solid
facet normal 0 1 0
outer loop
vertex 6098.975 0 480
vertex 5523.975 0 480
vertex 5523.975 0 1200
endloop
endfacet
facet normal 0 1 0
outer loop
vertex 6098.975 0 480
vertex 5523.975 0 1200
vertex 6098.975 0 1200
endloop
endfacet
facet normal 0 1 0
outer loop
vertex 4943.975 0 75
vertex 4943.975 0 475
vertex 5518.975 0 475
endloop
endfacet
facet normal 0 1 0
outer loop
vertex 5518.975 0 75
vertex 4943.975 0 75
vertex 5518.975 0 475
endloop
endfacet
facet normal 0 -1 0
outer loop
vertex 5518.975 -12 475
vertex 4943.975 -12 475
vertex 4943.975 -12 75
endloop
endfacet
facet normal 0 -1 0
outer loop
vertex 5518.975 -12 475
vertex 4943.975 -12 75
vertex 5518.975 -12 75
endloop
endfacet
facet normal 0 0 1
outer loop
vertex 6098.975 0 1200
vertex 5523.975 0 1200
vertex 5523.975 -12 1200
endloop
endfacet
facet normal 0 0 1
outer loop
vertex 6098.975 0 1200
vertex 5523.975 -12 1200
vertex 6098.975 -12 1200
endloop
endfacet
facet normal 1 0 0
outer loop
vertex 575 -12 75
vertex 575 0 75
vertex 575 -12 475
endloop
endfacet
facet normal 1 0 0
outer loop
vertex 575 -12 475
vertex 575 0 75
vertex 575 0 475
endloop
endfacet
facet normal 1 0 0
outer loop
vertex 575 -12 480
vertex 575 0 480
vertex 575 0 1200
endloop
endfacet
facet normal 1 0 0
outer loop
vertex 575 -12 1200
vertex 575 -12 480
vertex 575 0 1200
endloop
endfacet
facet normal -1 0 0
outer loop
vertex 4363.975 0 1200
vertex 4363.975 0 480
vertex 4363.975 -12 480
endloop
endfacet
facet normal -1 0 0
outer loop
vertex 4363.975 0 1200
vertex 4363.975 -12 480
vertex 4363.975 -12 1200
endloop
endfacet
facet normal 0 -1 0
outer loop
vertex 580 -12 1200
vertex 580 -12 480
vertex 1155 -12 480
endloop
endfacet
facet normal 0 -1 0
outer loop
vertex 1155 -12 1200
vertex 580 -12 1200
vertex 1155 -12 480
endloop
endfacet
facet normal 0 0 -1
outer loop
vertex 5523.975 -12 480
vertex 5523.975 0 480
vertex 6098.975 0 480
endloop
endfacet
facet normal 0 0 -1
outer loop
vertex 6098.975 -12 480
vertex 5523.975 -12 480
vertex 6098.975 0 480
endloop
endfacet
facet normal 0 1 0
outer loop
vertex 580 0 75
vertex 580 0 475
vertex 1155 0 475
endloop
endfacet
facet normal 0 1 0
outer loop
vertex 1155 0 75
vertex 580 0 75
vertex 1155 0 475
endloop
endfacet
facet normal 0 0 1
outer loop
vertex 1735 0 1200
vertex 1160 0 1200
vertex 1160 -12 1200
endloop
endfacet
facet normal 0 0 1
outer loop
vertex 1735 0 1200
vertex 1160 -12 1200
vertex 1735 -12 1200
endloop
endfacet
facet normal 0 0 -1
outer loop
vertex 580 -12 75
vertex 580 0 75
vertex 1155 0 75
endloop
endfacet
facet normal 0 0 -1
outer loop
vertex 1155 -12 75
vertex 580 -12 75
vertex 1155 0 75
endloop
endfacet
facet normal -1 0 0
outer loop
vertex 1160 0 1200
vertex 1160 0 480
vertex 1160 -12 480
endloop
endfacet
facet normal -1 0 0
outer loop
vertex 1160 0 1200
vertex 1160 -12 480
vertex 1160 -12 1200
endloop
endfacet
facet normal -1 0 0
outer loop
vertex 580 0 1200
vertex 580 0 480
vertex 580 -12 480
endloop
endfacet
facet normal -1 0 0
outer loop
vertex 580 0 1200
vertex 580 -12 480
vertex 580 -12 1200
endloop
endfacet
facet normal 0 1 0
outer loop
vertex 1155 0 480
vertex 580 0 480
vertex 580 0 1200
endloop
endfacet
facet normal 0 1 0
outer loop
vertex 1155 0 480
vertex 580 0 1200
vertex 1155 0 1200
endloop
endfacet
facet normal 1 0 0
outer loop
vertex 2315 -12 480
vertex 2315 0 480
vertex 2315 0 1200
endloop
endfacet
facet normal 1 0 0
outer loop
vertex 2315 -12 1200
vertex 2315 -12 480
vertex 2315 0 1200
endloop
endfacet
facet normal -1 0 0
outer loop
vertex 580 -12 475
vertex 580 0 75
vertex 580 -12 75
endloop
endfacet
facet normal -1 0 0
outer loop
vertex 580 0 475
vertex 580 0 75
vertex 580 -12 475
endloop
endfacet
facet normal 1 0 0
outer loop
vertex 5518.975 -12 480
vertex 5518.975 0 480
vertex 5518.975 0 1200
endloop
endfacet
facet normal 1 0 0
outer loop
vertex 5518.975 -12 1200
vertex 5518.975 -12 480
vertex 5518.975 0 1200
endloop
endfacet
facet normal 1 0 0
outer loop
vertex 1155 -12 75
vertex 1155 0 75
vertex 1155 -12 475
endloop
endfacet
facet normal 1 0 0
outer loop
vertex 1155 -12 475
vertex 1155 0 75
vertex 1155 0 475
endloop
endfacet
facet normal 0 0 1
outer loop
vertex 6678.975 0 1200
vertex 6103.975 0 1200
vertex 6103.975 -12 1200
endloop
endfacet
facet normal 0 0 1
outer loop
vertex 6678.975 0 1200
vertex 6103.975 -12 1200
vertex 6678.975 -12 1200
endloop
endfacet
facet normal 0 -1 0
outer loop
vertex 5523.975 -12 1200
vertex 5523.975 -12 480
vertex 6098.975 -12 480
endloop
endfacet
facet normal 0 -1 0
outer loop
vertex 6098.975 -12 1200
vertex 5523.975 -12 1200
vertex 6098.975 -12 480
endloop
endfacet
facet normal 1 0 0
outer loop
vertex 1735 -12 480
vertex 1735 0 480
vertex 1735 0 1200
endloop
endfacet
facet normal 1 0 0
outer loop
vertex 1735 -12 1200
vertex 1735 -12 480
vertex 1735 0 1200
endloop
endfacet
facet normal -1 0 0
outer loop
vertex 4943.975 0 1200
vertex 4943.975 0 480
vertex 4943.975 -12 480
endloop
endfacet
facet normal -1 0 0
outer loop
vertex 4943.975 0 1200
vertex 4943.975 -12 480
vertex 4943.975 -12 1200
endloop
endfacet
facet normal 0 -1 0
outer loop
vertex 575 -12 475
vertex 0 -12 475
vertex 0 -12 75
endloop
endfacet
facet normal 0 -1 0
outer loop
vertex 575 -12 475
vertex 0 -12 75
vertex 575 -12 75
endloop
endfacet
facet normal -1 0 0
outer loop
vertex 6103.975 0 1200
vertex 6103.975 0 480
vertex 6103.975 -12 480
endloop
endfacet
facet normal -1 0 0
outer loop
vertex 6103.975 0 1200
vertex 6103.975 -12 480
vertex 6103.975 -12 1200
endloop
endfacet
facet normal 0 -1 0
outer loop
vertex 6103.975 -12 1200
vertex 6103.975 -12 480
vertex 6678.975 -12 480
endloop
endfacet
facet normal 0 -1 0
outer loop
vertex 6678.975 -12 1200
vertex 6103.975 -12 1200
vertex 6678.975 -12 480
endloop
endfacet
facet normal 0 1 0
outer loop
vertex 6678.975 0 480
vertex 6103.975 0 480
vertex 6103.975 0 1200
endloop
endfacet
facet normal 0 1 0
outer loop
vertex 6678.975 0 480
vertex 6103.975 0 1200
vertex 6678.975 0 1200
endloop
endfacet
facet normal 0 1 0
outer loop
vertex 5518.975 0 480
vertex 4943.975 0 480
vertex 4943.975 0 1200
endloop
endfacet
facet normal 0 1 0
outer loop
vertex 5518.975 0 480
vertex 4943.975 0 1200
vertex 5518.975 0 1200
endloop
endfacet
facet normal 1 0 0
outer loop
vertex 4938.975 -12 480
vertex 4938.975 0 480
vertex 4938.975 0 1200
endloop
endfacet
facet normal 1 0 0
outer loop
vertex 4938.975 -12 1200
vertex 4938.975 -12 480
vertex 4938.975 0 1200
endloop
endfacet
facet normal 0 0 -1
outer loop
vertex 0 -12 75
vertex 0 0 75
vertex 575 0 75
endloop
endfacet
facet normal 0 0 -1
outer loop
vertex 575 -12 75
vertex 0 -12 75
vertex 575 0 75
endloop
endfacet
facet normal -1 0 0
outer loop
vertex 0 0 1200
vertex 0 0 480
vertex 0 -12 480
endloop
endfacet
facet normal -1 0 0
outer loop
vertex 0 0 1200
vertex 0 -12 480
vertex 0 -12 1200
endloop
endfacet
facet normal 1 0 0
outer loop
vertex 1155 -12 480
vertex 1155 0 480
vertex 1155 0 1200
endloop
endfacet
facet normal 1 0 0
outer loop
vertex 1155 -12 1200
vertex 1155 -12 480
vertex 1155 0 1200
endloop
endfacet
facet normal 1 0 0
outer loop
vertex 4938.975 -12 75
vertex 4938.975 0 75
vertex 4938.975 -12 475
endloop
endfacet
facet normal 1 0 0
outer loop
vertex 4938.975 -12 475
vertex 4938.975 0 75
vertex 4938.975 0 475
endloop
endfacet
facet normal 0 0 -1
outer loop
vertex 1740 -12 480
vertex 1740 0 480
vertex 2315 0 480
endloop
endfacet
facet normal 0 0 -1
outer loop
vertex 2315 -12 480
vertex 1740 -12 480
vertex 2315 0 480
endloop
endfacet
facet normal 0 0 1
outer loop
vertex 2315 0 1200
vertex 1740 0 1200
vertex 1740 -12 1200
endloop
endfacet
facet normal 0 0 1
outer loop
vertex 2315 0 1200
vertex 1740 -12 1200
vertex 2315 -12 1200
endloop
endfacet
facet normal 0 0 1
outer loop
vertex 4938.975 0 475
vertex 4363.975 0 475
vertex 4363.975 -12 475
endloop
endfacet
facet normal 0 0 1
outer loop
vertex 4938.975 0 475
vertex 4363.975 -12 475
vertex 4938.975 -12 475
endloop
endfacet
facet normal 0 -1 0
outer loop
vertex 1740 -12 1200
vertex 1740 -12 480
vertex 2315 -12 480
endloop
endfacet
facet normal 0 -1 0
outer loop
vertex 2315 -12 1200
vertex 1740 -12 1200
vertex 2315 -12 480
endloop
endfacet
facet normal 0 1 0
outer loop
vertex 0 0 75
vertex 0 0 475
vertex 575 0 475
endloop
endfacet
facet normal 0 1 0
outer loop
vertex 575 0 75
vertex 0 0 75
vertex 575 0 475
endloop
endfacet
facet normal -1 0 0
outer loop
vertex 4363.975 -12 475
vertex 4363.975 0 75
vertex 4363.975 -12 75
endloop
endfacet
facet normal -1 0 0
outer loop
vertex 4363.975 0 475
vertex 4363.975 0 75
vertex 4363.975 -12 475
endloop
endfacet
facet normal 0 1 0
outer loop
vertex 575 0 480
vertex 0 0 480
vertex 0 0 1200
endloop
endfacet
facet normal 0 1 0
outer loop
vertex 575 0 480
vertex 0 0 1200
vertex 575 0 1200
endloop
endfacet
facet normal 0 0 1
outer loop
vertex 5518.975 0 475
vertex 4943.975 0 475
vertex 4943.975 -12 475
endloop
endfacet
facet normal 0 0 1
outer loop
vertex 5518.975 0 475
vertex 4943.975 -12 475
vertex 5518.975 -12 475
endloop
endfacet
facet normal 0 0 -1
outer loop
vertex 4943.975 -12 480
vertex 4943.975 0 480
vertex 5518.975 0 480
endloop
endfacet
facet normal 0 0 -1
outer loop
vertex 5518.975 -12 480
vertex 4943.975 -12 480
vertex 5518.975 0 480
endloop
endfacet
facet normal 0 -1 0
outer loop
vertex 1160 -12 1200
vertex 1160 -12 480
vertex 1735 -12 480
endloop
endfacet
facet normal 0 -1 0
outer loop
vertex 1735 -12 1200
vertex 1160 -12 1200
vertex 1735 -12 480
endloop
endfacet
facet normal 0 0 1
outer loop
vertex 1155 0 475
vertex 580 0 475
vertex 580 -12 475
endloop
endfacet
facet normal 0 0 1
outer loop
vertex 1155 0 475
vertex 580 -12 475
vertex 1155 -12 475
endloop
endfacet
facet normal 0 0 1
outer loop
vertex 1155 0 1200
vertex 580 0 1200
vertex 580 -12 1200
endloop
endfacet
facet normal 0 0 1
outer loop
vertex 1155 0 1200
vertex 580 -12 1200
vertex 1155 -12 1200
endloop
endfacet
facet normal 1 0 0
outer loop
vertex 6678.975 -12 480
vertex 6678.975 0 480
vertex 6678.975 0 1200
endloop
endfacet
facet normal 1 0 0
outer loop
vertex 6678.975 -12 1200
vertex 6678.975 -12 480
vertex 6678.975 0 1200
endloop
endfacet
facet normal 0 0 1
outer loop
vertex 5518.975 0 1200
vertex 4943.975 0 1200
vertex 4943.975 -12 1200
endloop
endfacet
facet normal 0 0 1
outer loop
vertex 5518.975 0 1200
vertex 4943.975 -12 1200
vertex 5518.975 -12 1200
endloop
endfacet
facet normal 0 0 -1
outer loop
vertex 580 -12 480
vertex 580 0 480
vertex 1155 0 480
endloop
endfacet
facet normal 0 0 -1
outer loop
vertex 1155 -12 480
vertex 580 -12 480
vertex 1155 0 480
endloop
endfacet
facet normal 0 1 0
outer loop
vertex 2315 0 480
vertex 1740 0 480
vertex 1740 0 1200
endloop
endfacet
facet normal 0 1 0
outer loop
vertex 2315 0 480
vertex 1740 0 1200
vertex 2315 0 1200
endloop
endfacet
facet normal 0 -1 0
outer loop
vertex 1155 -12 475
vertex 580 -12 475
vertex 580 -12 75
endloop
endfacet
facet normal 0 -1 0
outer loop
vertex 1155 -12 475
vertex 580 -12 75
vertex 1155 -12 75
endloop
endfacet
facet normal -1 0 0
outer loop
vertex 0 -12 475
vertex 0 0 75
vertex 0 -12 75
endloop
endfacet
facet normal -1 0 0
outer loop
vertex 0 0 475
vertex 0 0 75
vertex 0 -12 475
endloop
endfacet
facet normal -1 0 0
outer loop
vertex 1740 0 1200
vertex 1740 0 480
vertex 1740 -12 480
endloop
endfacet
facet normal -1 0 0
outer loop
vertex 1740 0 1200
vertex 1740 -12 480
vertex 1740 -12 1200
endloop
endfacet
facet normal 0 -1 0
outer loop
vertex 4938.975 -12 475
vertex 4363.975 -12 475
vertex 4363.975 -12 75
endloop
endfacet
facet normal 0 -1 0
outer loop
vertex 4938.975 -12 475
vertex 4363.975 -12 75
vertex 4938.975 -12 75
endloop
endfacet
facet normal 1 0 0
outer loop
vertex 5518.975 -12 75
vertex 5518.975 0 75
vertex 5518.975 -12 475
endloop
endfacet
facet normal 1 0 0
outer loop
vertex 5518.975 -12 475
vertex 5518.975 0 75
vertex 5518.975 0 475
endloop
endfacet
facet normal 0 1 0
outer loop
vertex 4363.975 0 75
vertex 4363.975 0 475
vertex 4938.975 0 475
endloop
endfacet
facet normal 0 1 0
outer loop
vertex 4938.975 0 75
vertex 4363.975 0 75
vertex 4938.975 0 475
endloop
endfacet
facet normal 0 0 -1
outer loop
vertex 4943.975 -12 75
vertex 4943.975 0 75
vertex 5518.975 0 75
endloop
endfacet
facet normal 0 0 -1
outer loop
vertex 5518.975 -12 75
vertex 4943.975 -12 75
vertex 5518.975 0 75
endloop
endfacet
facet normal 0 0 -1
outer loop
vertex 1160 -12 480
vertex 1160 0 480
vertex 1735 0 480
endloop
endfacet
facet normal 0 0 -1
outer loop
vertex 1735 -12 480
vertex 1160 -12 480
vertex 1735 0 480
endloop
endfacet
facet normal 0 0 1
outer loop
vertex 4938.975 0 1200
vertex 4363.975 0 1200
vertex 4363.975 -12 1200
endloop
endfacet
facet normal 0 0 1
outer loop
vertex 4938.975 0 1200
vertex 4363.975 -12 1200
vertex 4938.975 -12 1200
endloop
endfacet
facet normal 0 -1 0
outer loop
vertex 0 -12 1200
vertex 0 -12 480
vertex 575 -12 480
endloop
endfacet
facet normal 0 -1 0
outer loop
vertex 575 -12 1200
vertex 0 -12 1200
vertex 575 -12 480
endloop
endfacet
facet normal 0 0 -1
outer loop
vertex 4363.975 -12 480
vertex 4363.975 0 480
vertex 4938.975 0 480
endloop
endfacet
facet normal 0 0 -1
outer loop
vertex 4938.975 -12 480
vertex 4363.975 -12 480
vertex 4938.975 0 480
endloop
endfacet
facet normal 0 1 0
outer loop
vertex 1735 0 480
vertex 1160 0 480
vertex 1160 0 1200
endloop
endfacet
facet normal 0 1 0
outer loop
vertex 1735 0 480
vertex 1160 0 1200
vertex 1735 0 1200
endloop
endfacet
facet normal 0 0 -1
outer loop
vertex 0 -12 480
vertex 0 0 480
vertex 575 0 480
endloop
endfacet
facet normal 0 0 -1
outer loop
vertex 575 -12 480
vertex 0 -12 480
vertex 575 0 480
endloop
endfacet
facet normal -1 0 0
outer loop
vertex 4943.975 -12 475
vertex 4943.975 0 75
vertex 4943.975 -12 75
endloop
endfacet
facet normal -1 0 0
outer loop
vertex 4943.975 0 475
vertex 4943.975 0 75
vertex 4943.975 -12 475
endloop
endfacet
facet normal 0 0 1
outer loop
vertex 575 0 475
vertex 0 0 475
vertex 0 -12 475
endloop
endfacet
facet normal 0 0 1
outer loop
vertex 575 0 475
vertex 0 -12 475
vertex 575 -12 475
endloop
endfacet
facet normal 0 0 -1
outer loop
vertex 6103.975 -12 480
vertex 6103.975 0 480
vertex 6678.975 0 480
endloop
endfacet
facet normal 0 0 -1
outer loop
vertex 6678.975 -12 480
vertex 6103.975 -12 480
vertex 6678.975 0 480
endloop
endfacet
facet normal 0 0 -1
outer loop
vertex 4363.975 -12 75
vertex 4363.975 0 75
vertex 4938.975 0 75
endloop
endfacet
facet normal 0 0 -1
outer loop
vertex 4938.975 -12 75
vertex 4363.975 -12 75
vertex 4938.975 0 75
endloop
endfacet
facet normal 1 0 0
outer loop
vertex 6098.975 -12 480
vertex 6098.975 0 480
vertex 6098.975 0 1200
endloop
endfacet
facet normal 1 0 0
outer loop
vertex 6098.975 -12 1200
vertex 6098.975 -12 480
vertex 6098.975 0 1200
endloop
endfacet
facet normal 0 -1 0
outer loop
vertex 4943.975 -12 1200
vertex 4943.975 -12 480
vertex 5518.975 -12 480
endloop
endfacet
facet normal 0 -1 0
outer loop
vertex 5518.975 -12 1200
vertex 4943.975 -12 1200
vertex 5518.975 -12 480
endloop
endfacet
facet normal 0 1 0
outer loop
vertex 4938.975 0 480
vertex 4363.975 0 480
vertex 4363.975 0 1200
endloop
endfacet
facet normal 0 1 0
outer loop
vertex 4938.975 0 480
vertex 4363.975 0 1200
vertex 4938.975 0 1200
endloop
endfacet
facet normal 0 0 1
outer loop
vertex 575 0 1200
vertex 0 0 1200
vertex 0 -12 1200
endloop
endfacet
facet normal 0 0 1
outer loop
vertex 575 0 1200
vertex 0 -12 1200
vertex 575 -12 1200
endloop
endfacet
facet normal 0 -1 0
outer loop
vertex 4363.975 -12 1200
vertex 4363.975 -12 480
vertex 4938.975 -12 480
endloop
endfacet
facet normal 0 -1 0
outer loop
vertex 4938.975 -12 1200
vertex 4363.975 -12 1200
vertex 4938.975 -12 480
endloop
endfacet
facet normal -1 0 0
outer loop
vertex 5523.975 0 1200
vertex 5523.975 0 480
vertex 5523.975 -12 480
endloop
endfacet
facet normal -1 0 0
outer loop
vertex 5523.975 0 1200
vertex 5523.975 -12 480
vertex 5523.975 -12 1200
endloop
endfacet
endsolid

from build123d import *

# Parameters (mm, degrees)
F0_W     = 575
F0_H     = 720
F0_H_2   = 400
F1_DEPTH = 12


with BuildPart() as f1:
    # F0 (on Front) → F1 (new body)
    with BuildSketch(Plane.XZ):
        with Locations((287.5, 840)):
            Rectangle(F0_W, F0_H)
        with Locations((867.5, 840)):
            Rectangle(F0_W, F0_H)
        with Locations((1447.5, 840)):
            Rectangle(F0_W, F0_H)
        with Locations((2027.5, 840)):
            Rectangle(F0_W, F0_H)
        with Locations((287.5, 275)):
            Rectangle(F0_W, F0_H_2)
        with Locations((867.5, 275)):
            Rectangle(F0_W, F0_H_2)
        with Locations((4651.474571, 840)):
            Rectangle(F0_W, F0_H)
        with Locations((5231.474571, 840)):
            Rectangle(F0_W, F0_H)
        with Locations((5811.474571, 840)):
            Rectangle(F0_W, F0_H)
        with Locations((6391.474571, 840)):
            Rectangle(F0_W, F0_H)
        with Locations((4651.474571, 275)):
            Rectangle(F0_W, F0_H_2)
        with Locations((5231.474571, 275)):
            Rectangle(F0_W, F0_H_2)
    extrude(amount=F1_DEPTH)


solid = f1.part
